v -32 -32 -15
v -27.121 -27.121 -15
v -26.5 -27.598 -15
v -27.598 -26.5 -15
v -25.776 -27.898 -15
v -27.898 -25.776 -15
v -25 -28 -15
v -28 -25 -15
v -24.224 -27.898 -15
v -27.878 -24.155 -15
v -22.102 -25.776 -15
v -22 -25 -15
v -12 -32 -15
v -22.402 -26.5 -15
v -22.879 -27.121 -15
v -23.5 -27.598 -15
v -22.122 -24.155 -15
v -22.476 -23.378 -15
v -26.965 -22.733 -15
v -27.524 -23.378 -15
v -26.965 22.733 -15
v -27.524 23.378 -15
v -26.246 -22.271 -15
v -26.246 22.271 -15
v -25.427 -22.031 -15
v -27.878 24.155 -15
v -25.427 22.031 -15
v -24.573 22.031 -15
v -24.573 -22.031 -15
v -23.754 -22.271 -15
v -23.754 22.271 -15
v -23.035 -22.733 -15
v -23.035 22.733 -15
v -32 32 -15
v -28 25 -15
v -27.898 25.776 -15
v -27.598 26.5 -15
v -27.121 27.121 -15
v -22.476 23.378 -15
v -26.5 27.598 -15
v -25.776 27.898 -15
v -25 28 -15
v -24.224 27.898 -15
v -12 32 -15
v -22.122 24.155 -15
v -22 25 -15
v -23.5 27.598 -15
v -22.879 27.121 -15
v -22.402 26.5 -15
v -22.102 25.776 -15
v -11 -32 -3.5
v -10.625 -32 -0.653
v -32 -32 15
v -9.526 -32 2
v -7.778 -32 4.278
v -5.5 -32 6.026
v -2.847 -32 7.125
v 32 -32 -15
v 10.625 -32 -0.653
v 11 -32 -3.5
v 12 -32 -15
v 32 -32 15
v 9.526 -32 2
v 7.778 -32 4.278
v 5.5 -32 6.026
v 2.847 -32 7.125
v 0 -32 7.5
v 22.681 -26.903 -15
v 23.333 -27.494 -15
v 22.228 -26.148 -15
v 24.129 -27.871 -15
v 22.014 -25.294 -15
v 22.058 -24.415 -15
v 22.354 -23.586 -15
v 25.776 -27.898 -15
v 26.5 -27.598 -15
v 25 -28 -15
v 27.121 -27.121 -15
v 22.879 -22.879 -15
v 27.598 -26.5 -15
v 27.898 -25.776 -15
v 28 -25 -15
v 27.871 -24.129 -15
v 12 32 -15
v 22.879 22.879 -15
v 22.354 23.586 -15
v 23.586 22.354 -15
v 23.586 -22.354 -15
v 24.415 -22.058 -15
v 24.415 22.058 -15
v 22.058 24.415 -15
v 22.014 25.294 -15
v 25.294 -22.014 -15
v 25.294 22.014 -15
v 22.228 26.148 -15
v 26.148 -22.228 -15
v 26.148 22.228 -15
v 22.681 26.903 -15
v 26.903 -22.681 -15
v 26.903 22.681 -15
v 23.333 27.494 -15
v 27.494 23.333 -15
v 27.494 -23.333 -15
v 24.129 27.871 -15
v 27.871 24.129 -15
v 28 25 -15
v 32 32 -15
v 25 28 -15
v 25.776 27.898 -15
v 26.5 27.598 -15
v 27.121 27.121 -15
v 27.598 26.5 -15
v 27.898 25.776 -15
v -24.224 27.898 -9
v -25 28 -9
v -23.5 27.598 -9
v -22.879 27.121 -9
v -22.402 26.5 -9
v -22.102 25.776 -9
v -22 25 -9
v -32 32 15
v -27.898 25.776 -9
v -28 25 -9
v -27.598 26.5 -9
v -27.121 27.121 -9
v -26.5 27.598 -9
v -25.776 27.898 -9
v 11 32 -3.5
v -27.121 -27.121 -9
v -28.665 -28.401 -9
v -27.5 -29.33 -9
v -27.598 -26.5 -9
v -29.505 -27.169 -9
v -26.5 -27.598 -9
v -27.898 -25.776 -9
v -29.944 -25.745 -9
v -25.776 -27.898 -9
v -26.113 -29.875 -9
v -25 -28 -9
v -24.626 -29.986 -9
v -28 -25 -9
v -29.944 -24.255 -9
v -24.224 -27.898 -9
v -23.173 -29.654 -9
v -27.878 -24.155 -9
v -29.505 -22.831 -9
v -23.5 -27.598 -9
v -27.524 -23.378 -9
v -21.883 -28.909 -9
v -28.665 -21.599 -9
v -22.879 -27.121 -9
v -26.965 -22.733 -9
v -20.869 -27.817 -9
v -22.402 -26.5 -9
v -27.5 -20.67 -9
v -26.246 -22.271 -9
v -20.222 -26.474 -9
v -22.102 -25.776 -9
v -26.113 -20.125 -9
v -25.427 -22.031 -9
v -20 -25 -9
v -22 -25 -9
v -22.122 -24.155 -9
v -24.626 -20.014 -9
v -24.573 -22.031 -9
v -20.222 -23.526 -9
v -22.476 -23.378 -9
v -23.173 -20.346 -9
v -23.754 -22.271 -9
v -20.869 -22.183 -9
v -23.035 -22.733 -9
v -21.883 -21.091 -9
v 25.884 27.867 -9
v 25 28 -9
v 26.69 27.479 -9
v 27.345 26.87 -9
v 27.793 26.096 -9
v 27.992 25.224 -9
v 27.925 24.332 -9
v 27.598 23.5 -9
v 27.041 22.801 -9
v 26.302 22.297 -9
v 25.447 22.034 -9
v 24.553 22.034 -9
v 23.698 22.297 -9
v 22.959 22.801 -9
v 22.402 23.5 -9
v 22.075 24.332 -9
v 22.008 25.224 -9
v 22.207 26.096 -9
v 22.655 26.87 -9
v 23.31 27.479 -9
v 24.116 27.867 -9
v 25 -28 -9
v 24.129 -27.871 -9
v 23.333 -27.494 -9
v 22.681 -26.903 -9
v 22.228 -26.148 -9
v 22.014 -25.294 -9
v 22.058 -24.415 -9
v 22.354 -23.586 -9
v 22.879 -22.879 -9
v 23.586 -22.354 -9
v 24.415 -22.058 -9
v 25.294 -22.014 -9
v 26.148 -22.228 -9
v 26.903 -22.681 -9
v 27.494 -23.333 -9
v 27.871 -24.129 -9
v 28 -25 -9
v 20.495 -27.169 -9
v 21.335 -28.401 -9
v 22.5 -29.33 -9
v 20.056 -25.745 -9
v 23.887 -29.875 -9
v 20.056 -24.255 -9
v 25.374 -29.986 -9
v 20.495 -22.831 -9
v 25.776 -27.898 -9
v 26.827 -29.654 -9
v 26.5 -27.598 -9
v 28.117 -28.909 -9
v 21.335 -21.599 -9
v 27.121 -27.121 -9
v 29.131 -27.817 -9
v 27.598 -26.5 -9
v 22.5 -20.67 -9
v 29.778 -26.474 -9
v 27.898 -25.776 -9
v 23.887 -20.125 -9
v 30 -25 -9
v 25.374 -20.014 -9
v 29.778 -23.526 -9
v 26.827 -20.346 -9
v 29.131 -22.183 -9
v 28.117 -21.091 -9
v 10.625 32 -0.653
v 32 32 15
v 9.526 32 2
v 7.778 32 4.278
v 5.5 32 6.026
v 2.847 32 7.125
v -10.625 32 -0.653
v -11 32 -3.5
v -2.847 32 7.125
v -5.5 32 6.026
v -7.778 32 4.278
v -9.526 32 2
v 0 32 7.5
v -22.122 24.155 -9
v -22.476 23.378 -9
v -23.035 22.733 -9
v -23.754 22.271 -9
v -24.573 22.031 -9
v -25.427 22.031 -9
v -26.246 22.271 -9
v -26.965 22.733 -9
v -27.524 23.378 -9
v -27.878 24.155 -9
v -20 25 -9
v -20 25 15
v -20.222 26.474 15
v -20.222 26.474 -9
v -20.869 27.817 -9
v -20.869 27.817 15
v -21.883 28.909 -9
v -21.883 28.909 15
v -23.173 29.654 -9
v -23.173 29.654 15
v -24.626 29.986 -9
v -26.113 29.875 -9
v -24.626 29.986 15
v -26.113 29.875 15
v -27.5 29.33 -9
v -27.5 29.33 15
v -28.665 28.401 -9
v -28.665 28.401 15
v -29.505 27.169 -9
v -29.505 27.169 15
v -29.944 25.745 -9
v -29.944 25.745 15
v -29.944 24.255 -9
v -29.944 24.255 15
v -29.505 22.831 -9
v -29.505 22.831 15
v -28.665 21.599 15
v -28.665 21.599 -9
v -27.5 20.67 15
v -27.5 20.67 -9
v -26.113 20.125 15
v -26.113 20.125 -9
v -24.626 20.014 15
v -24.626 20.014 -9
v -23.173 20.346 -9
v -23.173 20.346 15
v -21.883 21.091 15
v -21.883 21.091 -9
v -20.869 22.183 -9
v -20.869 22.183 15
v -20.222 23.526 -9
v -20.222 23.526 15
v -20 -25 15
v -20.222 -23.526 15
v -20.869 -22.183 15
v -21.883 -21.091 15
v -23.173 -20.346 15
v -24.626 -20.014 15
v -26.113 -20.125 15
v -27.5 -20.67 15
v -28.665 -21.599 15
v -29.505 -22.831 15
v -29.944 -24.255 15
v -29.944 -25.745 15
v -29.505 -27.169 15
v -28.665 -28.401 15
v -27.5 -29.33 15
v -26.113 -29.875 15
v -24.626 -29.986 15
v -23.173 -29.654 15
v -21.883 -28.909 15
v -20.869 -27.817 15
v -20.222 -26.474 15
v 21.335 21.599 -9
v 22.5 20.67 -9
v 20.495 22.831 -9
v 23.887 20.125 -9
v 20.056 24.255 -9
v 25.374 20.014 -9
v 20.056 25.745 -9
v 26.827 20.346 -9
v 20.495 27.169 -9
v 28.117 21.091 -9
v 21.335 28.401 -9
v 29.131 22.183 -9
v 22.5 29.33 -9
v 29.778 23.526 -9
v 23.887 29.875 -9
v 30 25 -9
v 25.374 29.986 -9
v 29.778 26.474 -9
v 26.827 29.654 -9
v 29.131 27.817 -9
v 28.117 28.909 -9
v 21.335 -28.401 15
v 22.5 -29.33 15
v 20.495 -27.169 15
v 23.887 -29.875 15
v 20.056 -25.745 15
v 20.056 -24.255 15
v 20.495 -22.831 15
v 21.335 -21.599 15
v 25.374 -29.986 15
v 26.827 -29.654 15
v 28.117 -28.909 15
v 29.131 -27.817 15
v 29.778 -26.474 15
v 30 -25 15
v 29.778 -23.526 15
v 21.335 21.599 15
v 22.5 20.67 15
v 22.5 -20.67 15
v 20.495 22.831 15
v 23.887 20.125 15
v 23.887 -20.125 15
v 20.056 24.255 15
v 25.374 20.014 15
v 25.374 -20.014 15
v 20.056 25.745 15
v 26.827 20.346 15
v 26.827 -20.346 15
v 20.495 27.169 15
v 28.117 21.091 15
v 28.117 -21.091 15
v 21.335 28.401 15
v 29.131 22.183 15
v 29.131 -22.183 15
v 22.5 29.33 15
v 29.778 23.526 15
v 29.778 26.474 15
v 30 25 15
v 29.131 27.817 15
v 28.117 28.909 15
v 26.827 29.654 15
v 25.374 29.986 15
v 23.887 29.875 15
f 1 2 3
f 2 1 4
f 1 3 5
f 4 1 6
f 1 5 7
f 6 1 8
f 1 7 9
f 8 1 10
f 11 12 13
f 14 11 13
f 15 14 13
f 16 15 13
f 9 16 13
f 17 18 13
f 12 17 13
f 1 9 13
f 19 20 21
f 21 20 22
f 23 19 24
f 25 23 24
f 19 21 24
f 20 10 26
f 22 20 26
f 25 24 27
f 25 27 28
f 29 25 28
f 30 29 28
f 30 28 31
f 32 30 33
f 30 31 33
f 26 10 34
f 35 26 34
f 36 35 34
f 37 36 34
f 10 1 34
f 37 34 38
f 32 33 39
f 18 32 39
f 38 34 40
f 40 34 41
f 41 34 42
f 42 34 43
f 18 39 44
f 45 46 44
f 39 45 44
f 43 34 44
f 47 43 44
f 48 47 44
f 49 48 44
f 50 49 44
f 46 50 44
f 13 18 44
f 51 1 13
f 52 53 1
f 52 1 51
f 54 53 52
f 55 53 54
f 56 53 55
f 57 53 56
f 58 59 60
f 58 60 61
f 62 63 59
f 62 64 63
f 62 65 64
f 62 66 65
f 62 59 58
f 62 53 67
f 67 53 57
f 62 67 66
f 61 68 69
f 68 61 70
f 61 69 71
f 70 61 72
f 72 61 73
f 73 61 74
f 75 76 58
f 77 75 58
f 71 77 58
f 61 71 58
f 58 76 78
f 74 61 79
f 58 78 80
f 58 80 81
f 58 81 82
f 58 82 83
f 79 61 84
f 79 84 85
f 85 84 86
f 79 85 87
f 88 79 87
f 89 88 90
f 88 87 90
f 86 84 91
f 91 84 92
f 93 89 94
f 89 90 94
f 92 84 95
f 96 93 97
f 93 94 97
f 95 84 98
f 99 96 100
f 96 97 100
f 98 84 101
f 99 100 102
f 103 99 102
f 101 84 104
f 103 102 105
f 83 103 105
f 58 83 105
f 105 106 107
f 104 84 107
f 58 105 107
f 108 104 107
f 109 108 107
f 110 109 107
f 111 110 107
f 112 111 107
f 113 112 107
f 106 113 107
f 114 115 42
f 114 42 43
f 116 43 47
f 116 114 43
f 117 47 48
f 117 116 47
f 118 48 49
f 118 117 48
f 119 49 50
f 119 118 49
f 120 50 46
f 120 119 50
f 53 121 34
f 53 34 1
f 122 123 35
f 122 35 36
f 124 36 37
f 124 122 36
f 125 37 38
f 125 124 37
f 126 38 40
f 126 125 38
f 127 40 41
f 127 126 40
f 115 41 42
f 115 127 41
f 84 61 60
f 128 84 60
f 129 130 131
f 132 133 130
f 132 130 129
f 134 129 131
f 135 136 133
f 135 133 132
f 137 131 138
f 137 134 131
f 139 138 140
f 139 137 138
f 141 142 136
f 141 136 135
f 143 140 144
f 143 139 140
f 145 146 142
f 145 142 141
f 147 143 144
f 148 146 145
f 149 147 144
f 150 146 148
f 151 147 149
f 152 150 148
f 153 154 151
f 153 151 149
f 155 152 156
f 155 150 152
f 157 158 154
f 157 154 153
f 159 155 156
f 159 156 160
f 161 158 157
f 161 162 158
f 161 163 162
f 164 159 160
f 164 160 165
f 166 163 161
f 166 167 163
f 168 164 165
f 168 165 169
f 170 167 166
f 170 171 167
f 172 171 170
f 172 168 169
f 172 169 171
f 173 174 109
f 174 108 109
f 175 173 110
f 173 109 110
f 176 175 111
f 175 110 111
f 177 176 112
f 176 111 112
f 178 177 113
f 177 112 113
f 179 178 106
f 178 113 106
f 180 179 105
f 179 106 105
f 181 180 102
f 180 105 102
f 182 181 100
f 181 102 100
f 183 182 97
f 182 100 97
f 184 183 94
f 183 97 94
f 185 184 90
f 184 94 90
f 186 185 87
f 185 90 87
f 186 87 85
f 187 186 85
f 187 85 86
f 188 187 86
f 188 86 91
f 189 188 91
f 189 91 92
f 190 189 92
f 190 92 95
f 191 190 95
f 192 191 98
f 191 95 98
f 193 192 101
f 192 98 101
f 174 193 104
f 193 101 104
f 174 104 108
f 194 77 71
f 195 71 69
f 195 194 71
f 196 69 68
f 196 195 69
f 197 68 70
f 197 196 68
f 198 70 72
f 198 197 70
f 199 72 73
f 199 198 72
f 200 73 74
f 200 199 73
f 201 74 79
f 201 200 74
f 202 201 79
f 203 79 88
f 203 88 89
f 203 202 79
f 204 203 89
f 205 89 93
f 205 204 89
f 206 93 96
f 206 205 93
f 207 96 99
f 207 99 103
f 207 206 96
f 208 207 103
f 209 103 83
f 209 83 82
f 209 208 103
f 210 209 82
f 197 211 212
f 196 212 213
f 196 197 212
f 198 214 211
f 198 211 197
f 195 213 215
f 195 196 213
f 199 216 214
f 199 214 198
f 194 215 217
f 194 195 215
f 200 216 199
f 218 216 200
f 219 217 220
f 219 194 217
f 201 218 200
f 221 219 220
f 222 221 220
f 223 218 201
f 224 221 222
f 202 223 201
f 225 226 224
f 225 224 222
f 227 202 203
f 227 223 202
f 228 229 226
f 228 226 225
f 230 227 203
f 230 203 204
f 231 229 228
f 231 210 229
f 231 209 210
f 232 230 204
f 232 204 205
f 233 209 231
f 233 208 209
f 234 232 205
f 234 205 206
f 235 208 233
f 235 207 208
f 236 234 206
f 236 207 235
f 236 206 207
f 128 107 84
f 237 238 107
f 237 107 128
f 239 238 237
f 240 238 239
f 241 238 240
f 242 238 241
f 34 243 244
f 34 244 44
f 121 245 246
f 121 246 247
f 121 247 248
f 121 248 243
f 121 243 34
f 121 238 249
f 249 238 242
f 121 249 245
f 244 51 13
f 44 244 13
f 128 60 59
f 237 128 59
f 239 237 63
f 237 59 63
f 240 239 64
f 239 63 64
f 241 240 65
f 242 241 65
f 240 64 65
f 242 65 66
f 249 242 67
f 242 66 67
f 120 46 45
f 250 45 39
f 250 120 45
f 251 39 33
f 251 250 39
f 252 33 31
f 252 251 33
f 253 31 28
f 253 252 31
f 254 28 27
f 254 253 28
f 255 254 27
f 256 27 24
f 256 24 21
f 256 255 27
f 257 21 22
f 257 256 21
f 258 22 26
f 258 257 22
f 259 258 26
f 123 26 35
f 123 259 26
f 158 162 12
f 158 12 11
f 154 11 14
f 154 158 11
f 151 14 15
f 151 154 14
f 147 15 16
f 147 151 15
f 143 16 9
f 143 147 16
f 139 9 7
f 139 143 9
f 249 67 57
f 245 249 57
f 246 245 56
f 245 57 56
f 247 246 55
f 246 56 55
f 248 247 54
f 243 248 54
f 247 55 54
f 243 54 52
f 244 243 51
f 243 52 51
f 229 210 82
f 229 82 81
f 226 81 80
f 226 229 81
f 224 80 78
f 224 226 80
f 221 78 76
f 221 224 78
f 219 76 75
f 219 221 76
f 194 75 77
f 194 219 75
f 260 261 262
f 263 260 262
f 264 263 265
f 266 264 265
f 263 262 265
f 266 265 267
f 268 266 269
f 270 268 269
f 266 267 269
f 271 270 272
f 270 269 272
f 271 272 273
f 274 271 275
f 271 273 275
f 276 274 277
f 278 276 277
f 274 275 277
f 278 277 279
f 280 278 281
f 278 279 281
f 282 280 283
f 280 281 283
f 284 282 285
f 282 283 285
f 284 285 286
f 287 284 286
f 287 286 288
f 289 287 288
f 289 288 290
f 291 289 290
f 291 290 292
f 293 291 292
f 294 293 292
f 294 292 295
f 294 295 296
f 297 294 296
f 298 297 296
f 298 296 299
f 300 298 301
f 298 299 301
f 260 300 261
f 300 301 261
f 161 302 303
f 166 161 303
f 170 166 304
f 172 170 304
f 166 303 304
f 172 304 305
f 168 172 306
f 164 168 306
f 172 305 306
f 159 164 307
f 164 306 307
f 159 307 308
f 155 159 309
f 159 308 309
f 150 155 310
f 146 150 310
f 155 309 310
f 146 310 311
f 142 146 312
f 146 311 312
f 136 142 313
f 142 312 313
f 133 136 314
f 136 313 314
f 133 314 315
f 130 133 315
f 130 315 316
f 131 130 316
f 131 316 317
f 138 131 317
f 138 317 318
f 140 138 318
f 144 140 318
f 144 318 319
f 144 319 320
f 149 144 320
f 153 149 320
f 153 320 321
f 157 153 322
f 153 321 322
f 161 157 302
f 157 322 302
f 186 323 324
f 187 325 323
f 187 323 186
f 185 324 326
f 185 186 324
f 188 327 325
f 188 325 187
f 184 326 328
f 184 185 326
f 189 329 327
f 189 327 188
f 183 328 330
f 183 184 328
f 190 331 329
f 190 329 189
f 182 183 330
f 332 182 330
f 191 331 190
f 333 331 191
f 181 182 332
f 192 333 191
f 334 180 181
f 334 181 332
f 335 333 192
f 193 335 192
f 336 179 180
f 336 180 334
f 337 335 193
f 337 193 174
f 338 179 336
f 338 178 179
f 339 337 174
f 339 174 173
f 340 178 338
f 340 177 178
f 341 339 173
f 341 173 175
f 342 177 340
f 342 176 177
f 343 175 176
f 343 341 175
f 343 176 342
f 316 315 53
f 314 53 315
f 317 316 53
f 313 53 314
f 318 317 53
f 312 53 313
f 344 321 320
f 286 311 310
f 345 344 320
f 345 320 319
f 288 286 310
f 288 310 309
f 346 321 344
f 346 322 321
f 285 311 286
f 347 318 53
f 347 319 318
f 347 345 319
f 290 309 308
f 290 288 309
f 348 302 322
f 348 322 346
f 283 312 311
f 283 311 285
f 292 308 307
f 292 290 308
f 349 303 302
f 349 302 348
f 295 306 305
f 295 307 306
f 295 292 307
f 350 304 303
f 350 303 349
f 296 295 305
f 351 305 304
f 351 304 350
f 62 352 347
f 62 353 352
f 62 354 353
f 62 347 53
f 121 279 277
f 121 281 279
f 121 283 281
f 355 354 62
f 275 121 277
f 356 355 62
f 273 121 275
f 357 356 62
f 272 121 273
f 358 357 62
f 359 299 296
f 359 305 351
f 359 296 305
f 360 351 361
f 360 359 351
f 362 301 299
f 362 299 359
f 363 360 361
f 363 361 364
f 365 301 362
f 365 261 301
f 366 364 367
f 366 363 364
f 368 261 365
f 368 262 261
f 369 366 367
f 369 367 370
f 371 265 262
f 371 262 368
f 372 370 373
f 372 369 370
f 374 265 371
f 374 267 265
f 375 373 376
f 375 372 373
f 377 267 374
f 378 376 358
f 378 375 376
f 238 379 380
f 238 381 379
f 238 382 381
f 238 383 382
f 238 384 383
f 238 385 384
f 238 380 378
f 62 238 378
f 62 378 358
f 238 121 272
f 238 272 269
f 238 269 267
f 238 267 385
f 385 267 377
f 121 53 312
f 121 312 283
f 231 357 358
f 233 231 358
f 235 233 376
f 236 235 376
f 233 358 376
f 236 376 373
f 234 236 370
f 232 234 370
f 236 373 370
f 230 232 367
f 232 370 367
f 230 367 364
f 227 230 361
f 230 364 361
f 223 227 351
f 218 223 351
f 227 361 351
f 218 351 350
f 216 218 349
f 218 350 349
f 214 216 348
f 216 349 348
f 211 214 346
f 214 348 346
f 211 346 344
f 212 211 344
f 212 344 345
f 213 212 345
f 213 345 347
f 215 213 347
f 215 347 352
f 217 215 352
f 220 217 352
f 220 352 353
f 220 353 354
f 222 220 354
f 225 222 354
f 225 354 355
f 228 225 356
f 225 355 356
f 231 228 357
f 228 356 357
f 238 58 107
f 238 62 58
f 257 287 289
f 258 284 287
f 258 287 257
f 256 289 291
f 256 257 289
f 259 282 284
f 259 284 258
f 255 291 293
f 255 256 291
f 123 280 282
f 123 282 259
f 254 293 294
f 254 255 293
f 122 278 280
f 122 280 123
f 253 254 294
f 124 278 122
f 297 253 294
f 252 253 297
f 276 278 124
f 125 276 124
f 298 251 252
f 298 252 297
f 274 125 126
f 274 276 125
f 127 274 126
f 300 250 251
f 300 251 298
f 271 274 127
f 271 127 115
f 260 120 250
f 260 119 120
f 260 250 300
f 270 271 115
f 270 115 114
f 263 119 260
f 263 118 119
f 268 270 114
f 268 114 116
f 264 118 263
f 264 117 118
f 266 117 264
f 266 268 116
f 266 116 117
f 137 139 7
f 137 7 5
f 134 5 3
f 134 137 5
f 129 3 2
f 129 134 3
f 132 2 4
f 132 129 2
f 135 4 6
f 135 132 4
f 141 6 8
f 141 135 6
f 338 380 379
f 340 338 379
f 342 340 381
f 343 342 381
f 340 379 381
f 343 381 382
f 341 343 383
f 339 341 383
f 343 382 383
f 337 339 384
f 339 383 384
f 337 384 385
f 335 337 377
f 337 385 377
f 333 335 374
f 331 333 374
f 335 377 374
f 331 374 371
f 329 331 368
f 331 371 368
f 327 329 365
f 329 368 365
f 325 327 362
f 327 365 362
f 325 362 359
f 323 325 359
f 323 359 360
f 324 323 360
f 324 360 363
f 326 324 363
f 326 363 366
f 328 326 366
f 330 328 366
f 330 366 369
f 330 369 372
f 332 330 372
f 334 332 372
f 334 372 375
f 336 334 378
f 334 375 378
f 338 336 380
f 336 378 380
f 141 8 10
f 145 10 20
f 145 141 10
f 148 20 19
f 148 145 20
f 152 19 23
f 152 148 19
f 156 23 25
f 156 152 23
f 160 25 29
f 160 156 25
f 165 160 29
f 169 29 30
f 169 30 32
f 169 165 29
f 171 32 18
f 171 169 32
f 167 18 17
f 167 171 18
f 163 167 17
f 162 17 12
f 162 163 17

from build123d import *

# Parameters (mm, degrees)
F1_DEPTH = 15
F3_DEPTH = 64
F4_R     = 5
F4_R_2   = 3
F5_DEPTH = 24


with BuildPart() as f1:
    # F0 (on Top) → F1 (new body, symmetric)
    with BuildSketch(Plane.XY):
        with BuildLine():
            Line((25, -32), (32, -32))
            Line((32, -32), (32, -25))
            Line((32, -25), (28, -25))
            ThreePointArc((28, -25), (27.1213203436, -27.1213203436), (25, -28))
            Line((25, -28), (25, -32))
        make_face()
        with BuildLine():
            Line((12, -32), (25, -32))
            Line((25, -32), (25, -28))
            ThreePointArc((25, -28), (22.8786796564, -22.8786796564), (28, -25))
            Line((28, -25), (32, -25))
            Line((32, -25), (32, 25))
            Line((32, 25), (28, 25))
            ThreePointArc((28, 25), (22.8786796564, 22.8786796564), (25, 28))
            Line((25, 28), (25, 32))
            Line((25, 32), (-25, 32))
            Line((-25, 32), (-25, 28))
            ThreePointArc((-25, 28), (-22.8786796564, 27.1213203436), (-22, 25))
            ThreePointArc((-22, 25), (-25, 22), (-28, 25))
            Line((-28, 25), (-32, 25))
            Line((-32, 25), (-32, -25))
            Line((-32, -25), (-28, -25))
            ThreePointArc((-28, -25), (-25, -22), (-22, -25))
            ThreePointArc((-22, -25), (-22.8786796564, -27.1213203436), (-25, -28))
            Line((-25, -28), (-25, -32))
            Line((-25, -32), (-12, -32))
            Line((-12, -32), (12, -32))
        make_face()
        with BuildLine():
            Line((28, 25), (32, 25))
            Line((32, 25), (32, 32))
            Line((32, 32), (25, 32))
            Line((25, 32), (25, 28))
            ThreePointArc((25, 28), (27.1213203436, 27.1213203436), (28, 25))
        make_face()
        with BuildLine():
            Line((-32, -32), (-25, -32))
            Line((-25, -32), (-25, -28))
            ThreePointArc((-25, -28), (-27.1213203436, -27.1213203436), (-28, -25))
            Line((-28, -25), (-32, -25))
            Line((-32, -25), (-32, -32))
        make_face()
        with BuildLine():
            Line((-25, 28), (-25, 32))
            Line((-25, 32), (-32, 32))
            Line((-32, 32), (-32, 25))
            Line((-32, 25), (-28, 25))
            ThreePointArc((-28, 25), (-27.1213203436, 27.1213203436), (-25, 28))
        make_face()
        with BuildLine():
            Line((12, -32), (25, -32))
            Line((25, -32), (25, -28))
            ThreePointArc((25, -28), (22.8786796564, -22.8786796564), (28, -25))
            Line((28, -25), (32, -25))
            Line((32, -25), (32, 25))
            Line((32, 25), (28, 25))
            ThreePointArc((28, 25), (22.8786796564, 22.8786796564), (25, 28))
            Line((25, 28), (25, 32))
            Line((25, 32), (-25, 32))
            Line((-25, 32), (-25, 28))
            ThreePointArc((-25, 28), (-22.8786796564, 27.1213203436), (-22, 25))
            ThreePointArc((-22, 25), (-25, 22), (-28, 25))
            Line((-28, 25), (-32, 25))
            Line((-32, 25), (-32, -25))
            Line((-32, -25), (-28, -25))
            ThreePointArc((-28, -25), (-25, -22), (-22, -25))
            ThreePointArc((-22, -25), (-22.8786796564, -27.1213203436), (-25, -28))
            Line((-25, -28), (-25, -32))
            Line((-25, -32), (-12, -32))
            Line((-12, -32), (12, -32))
        make_face()
    extrude(amount=F1_DEPTH, both=True)

    # F2 (on face) → F3 (cut)
    with BuildSketch(Plane.XZ.offset(32)):
        with BuildLine():
            Line((-11, -3.5), (-12, -15))
            Line((-12, -15), (0, -15))
            Line((0, -15), (0, -14.5))
            ThreePointArc((0, -14.5), (-7.7781745931, -11.2781745931), (-11, -3.5))
        make_face()
        with BuildLine():
            Line((0, -3.5), (-11, -3.5))
            ThreePointArc((-11, -3.5), (-7.7781745931, -11.2781745931), (0, -14.5))
            Line((0, -14.5), (0, -3.5))
        make_face()
        with BuildLine():
            Line((0, -3.5), (0, -14.5))
            ThreePointArc((0, -14.5), (7.7781745931, -11.2781745931), (11, -3.5))
            Line((11, -3.5), (0, -3.5))
        make_face()
        with BuildLine():
            Line((0, -14.5), (0, -15))
            Line((0, -15), (12, -15))
            Line((12, -15), (11, -3.5))
            ThreePointArc((11, -3.5), (7.7781745931, -11.2781745931), (0, -14.5))
        make_face()
        with BuildLine():
            ThreePointArc((11, -3.5), (7.7781745931, 4.2781745931), (0, 7.5))
            Line((0, 7.5), (0, -3.5))
            Line((0, -3.5), (11, -3.5))
        make_face()
        with BuildLine():
            ThreePointArc((0, 7.5), (-7.7781745931, 4.2781745931), (-11, -3.5))
            Line((-11, -3.5), (0, -3.5))
            Line((0, -3.5), (0, 7.5))
        make_face()
    extrude(amount=-F3_DEPTH, mode=Mode.SUBTRACT)

    # F4 (on face) → F5 (cut)
    with BuildSketch(Plane.XY.offset(15)):
        with Locations((-25, -25)):
            Circle(F4_R)
        with Locations((-25, -25)):
            Circle(F4_R_2, mode=Mode.SUBTRACT)
        with Locations((-25, 25)):
            Circle(F4_R)
        with Locations((-25, 25)):
            Circle(F4_R_2, mode=Mode.SUBTRACT)
        with Locations((25, 25)):
            Circle(F4_R)
        with Locations((25, 25)):
            Circle(F4_R_2, mode=Mode.SUBTRACT)
        with Locations((25, -25)):
            Circle(F4_R)
        with Locations((25, -25)):
            Circle(F4_R_2, mode=Mode.SUBTRACT)
        with Locations((-25, -25)):
            Circle(F4_R_2)
        with Locations((25, -25)):
            Circle(F4_R_2)
        with Locations((25, 25)):
            Circle(F4_R_2)
        with Locations((-25, 25)):
            Circle(F4_R_2)
    extrude(amount=-F5_DEPTH, mode=Mode.SUBTRACT)


solid = f1.part
